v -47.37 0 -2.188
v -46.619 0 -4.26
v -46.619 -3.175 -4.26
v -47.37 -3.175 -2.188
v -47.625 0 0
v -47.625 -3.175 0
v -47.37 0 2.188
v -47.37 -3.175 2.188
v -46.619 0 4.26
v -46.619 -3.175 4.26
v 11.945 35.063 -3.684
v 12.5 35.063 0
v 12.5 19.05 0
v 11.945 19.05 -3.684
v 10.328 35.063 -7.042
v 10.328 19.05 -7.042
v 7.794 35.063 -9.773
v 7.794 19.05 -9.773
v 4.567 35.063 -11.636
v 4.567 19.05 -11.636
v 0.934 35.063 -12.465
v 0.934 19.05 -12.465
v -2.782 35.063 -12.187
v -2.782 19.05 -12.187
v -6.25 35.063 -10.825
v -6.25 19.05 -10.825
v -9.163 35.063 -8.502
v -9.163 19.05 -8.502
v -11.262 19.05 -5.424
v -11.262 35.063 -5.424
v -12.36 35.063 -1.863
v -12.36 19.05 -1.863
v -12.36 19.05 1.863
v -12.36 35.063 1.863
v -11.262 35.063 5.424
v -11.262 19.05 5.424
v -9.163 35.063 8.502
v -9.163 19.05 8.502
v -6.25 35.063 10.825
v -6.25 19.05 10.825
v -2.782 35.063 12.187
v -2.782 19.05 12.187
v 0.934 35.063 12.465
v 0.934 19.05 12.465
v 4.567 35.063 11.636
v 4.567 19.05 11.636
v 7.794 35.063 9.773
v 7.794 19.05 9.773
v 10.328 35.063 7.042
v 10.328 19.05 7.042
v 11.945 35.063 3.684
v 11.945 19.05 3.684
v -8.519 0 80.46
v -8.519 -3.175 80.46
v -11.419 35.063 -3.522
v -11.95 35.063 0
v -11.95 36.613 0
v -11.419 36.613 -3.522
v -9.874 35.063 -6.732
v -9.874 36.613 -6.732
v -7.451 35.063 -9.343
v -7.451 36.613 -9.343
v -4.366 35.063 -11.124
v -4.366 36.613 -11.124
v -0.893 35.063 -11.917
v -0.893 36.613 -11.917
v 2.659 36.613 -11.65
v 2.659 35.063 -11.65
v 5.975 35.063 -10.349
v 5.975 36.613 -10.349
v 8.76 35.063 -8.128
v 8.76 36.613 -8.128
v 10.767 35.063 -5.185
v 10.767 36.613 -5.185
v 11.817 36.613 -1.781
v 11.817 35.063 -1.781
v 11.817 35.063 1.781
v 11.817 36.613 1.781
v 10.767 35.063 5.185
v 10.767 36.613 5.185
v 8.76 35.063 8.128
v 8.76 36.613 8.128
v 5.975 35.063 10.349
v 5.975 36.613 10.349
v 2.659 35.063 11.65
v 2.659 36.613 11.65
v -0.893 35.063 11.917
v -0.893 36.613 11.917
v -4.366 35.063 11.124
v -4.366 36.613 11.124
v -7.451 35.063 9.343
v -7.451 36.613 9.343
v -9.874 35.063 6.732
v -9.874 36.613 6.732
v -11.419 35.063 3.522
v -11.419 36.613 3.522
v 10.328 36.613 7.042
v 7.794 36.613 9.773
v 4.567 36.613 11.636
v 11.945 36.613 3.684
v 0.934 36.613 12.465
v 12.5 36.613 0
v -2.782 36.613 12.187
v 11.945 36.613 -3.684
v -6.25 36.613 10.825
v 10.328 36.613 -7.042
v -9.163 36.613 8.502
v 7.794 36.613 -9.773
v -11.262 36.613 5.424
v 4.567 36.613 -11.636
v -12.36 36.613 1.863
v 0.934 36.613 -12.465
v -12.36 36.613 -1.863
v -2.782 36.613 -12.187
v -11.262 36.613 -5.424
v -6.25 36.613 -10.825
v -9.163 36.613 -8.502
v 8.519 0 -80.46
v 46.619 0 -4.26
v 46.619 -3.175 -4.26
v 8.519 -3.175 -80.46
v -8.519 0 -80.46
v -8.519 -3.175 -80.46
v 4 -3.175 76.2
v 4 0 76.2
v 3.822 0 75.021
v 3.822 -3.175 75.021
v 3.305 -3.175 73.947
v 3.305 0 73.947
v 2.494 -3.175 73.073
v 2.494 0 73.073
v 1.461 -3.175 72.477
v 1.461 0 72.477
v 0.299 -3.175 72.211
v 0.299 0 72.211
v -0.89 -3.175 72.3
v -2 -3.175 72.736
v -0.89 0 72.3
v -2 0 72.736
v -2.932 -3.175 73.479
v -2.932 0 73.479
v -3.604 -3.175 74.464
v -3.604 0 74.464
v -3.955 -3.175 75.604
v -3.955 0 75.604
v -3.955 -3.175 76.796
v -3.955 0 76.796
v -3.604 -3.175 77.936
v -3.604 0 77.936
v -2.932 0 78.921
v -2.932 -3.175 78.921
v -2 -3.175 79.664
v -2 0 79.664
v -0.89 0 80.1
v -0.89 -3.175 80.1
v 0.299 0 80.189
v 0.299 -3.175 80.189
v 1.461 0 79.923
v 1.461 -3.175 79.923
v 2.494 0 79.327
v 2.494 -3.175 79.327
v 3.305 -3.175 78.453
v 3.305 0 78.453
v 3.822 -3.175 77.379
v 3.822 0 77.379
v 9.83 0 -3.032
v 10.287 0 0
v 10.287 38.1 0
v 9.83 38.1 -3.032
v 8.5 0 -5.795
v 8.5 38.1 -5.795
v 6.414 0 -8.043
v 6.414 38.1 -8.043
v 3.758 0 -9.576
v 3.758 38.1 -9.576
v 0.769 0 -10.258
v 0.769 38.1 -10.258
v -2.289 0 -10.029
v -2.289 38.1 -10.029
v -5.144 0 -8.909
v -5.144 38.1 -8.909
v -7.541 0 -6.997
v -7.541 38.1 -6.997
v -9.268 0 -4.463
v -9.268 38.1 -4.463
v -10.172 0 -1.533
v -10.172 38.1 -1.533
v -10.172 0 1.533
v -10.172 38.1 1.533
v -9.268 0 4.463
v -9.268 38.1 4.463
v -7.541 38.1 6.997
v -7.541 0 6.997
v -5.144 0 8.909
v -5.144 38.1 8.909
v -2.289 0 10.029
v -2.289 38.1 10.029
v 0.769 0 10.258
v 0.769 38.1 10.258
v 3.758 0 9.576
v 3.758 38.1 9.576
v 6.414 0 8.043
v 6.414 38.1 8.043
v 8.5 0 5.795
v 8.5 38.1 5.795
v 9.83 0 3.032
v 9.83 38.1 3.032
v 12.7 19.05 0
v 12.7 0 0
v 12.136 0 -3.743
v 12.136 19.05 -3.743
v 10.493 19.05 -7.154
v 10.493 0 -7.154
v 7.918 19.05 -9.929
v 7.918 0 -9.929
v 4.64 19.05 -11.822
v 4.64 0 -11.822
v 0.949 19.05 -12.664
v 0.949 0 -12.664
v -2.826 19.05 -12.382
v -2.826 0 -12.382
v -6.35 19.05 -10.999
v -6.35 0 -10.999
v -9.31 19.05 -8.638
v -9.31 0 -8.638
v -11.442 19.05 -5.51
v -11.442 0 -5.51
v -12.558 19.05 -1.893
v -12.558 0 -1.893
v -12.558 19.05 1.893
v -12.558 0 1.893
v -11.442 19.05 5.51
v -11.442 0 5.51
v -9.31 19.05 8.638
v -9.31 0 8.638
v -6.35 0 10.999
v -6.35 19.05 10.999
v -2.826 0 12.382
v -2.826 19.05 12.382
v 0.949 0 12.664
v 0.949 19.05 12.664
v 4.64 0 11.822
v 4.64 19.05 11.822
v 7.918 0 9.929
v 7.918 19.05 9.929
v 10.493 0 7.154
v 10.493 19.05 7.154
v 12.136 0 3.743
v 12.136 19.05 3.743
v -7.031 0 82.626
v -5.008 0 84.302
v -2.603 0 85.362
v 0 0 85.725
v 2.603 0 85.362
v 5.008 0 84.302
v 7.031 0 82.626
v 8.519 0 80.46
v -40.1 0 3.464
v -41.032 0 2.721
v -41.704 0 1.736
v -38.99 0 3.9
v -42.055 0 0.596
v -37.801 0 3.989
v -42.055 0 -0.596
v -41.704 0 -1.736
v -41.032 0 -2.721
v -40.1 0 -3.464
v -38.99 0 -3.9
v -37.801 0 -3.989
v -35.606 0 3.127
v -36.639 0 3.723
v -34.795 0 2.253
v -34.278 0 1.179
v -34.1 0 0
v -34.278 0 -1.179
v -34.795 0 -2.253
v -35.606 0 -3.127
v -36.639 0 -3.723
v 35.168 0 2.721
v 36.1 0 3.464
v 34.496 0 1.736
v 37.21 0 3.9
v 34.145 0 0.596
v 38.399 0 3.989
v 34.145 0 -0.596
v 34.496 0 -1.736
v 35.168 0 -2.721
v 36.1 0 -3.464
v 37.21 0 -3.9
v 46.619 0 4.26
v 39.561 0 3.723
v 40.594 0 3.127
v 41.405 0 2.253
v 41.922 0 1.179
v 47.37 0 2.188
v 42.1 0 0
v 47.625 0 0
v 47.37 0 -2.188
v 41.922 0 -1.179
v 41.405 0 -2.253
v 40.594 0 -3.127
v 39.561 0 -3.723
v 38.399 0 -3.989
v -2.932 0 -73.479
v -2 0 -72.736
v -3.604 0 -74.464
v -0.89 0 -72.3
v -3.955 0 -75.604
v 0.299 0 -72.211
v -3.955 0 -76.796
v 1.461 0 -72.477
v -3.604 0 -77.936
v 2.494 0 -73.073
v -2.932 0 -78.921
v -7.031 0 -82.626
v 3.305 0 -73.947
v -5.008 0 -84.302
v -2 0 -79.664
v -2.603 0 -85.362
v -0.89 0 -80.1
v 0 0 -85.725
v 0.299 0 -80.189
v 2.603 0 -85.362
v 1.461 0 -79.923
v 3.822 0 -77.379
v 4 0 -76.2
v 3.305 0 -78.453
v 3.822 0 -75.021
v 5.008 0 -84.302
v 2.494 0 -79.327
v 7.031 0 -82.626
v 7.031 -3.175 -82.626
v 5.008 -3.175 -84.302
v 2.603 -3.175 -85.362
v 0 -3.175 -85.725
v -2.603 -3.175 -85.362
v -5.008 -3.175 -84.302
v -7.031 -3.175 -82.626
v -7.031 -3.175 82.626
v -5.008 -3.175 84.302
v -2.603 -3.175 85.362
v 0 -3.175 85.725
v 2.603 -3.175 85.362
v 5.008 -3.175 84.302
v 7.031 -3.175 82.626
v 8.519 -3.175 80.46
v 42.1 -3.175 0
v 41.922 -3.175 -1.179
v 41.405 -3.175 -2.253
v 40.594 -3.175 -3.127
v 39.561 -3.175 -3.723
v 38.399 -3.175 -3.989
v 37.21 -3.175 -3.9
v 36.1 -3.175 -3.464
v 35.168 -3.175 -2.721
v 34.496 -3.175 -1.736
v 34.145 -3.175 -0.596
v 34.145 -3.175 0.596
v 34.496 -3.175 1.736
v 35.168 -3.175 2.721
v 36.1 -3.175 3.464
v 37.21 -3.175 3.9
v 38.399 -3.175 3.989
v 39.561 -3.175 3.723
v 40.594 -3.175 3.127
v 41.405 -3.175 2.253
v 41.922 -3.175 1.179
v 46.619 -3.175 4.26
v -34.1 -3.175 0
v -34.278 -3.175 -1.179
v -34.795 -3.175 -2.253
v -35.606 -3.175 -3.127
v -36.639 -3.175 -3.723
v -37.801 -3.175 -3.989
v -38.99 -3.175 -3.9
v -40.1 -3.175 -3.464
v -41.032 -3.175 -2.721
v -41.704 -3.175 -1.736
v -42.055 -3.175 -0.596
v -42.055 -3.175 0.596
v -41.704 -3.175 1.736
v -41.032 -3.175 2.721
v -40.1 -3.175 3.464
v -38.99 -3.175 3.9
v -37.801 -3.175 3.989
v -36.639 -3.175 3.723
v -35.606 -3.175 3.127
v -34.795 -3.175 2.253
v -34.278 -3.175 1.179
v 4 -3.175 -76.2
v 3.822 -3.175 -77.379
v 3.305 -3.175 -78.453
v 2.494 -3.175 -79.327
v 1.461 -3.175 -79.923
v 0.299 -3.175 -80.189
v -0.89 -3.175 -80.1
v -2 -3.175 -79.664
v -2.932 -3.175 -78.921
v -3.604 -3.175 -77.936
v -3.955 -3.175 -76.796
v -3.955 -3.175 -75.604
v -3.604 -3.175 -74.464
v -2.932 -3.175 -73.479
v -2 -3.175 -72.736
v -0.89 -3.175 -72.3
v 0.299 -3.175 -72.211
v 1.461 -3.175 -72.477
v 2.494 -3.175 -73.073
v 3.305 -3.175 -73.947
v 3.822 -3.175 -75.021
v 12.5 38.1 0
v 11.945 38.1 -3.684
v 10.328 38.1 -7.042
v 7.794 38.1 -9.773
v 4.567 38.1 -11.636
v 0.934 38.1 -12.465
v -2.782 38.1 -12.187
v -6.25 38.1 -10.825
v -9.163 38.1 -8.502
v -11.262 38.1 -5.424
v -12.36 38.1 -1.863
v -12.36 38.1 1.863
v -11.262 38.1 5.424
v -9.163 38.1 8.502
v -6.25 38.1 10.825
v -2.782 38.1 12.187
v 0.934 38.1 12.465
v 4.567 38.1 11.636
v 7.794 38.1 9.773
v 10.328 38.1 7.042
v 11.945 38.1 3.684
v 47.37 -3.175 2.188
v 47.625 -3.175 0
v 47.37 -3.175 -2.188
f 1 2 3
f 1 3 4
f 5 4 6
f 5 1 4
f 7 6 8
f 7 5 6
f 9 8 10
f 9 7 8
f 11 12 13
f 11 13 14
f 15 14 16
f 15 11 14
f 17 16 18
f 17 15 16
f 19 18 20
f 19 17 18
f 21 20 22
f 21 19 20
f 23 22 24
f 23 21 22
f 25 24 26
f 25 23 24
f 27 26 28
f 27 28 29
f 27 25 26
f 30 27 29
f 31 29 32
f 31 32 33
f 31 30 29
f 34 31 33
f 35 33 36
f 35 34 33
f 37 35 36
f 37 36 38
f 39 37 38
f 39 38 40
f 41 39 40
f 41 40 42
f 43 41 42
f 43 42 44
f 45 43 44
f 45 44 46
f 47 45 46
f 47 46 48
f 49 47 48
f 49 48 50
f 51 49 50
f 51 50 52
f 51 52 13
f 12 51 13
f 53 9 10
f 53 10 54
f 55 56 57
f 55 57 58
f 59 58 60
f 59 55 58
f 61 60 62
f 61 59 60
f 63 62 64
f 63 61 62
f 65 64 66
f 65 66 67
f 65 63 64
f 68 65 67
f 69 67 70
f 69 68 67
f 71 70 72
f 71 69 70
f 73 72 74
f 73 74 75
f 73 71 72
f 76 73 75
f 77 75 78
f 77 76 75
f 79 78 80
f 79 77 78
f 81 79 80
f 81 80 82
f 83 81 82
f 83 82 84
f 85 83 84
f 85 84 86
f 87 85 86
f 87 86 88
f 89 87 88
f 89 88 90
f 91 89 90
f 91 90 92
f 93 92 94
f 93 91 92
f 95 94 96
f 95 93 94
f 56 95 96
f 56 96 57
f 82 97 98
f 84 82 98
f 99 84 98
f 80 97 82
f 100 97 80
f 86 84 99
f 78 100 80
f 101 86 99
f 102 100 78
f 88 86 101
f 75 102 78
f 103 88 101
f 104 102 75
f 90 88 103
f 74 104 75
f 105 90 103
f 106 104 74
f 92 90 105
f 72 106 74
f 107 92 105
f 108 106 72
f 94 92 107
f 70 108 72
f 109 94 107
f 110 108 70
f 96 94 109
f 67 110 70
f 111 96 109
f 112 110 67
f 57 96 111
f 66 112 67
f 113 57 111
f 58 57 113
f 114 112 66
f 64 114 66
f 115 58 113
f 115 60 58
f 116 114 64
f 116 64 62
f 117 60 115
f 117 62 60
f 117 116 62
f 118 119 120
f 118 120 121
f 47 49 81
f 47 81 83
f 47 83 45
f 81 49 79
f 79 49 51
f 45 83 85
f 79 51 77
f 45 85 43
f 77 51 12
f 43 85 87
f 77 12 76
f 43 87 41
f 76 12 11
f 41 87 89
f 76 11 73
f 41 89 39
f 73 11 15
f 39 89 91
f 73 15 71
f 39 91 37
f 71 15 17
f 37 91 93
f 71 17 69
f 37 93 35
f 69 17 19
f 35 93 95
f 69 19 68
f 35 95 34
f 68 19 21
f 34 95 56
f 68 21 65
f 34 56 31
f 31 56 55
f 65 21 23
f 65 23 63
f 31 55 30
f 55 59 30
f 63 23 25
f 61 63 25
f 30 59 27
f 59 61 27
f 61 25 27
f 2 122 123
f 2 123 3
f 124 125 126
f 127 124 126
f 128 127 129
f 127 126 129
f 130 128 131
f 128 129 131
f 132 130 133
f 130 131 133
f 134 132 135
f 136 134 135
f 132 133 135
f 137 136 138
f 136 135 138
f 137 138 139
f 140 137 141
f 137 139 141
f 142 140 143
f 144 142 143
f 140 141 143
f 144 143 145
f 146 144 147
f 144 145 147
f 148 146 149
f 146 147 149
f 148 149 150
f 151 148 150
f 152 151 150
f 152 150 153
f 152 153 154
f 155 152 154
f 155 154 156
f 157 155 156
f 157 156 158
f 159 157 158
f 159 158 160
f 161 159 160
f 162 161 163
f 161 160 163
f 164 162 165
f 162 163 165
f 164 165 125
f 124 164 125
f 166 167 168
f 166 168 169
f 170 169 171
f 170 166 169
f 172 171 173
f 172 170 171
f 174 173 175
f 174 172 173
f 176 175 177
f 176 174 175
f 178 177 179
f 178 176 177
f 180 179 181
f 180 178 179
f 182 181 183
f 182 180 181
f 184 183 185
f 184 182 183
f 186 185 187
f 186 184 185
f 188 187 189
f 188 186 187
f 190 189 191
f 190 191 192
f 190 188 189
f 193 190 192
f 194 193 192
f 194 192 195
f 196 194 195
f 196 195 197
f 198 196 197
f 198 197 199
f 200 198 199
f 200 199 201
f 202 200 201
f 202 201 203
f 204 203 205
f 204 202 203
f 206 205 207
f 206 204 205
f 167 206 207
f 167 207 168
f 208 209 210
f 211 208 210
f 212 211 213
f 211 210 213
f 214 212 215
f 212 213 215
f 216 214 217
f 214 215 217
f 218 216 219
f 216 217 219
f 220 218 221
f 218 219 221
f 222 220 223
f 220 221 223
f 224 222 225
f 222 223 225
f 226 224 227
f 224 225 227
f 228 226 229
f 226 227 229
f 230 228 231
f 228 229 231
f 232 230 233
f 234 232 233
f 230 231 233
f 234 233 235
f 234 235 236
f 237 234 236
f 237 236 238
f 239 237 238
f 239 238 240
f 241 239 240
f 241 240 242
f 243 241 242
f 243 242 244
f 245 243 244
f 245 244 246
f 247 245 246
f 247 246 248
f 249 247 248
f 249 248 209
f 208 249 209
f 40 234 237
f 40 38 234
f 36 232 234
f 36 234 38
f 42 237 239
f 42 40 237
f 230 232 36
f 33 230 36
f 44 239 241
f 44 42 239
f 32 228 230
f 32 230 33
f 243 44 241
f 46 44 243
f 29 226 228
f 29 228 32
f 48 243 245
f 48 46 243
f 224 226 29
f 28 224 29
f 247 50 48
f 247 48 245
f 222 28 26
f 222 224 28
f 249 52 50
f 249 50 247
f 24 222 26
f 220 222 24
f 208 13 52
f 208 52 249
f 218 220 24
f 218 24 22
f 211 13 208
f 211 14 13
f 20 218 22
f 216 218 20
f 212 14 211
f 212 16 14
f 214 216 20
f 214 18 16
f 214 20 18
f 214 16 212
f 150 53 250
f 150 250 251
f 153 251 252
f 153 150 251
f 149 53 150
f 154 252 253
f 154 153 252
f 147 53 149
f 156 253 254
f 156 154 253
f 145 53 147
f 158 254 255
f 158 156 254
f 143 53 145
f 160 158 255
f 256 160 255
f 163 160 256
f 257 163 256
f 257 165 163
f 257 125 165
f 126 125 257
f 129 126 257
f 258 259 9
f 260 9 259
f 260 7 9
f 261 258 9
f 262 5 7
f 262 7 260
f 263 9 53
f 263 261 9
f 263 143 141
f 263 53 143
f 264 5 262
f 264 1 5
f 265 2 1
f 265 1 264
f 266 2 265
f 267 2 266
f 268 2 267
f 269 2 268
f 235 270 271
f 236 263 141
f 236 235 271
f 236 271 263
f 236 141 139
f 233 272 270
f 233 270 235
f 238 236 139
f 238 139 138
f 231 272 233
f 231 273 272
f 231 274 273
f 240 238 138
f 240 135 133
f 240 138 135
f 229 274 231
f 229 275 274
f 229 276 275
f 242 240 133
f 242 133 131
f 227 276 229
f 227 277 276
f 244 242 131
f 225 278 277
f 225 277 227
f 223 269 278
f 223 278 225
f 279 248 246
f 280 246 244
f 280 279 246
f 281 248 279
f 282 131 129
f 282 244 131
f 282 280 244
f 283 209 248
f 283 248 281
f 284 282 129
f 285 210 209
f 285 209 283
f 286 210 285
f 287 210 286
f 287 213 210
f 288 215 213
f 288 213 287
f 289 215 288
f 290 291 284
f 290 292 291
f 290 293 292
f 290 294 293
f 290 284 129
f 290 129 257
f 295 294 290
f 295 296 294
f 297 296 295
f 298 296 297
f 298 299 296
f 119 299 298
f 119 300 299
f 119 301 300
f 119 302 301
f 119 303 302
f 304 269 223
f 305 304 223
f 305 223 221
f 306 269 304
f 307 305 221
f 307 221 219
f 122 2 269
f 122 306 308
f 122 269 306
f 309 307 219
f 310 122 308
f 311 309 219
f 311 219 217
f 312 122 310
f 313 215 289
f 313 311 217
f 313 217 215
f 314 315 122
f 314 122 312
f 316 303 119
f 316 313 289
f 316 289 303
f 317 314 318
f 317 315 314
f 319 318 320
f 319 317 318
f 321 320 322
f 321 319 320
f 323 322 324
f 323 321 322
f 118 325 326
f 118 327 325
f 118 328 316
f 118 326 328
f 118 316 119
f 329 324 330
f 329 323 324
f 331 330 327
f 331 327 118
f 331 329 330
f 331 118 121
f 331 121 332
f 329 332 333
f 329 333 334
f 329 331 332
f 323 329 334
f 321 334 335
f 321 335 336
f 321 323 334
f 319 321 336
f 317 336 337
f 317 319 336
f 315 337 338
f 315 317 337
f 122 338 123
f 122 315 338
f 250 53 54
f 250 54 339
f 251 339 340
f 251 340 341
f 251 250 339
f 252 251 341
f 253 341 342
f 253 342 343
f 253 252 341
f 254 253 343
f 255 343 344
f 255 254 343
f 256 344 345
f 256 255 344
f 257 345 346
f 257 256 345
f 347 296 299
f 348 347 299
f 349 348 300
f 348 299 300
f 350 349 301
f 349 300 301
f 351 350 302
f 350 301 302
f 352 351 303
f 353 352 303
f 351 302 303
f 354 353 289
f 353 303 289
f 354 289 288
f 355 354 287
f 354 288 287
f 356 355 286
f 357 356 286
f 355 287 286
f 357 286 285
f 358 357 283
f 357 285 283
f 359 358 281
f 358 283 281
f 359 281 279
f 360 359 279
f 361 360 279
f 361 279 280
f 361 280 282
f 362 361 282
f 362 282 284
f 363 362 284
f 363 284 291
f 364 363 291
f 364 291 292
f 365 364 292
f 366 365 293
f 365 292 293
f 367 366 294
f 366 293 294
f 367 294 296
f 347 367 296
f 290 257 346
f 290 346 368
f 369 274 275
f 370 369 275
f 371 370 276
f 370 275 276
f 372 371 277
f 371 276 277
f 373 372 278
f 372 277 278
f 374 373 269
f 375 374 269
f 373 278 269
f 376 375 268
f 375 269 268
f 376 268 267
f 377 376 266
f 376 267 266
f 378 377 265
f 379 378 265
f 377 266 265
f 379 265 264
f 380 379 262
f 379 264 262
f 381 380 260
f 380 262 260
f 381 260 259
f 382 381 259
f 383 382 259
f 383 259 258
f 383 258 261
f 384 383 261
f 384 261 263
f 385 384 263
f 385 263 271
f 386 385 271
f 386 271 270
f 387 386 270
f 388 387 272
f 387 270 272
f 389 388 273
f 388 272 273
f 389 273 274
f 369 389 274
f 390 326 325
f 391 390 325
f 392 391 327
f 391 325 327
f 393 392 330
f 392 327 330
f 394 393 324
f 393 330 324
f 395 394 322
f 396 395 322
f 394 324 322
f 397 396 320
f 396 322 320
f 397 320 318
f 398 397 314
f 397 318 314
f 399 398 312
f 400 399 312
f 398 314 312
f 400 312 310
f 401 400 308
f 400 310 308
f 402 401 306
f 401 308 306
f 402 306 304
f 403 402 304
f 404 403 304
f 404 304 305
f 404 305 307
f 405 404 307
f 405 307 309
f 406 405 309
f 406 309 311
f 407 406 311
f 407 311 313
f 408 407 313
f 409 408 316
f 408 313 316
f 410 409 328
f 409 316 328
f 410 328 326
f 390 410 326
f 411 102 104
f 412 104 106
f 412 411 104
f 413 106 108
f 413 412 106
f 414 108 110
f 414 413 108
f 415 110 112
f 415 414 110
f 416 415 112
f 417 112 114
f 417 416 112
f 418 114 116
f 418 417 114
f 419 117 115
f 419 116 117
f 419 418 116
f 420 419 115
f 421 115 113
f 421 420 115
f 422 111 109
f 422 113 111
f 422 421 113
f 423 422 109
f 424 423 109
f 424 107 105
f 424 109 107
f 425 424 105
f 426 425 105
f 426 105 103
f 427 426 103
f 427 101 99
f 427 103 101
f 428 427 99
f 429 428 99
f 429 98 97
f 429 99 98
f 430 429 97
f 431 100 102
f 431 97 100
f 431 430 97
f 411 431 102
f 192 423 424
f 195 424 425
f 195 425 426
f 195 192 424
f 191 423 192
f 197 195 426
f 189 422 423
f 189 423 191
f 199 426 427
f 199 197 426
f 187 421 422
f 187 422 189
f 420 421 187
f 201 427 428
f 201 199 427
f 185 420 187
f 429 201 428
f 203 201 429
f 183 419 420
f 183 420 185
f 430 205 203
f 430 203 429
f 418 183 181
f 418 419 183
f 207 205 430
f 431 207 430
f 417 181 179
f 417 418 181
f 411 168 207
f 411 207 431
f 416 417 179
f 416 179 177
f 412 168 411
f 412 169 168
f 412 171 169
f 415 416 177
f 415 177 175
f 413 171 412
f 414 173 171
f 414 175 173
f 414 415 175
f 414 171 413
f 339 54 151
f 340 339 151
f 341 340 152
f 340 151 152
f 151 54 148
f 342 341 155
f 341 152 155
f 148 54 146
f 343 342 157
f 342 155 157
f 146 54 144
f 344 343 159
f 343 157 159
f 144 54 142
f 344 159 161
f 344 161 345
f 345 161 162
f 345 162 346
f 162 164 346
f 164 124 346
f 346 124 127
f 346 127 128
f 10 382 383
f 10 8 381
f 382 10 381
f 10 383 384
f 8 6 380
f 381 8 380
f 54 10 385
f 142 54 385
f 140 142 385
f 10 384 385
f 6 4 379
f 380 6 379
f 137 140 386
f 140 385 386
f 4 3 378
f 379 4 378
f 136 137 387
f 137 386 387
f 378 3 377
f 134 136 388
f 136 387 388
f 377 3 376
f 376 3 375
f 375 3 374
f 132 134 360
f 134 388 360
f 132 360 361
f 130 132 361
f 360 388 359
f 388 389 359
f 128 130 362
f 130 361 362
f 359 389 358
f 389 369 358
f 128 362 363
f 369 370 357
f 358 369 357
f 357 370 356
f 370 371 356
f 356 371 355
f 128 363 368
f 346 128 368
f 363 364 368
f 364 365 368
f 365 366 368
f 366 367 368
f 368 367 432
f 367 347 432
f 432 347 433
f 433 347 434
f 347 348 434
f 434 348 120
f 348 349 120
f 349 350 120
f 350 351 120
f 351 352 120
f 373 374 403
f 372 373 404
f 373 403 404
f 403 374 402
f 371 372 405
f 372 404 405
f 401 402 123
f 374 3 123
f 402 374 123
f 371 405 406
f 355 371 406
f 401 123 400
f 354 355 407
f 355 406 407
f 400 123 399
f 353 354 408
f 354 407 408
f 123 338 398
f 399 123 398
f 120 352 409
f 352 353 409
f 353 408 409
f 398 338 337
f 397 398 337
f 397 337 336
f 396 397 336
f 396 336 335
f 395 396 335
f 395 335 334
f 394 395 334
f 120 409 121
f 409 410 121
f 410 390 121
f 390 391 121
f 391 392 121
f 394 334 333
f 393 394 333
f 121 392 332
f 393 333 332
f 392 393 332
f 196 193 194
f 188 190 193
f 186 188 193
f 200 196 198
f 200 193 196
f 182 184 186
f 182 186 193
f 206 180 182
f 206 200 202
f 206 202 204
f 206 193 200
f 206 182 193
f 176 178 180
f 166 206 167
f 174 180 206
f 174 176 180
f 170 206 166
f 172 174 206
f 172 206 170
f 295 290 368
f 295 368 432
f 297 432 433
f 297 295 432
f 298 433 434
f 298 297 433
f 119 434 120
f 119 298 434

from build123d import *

# Parameters (mm, degrees)
SKETCH1_R           = 4
BOSS_EXTRUDE1_DEPTH = 3.175
SKETCH2_R           = 12.7
SKETCH2_R_2         = 10.287
EXTRUDE_THIN1_DEPTH = 38.1
SKETCH3_R           = 12.7
SKETCH3_R_2         = 12.5
CUT_EXTRUDE2_DEPTH  = 19.05
SKETCH4_R           = 12.5
SKETCH4_R_2         = 11.95
CUT_EXTRUDE3_DEPTH  = 1.55


with BuildPart() as part:
    # Sketch1 → Boss-Extrude1 (new body)
    with BuildSketch(Plane(origin=(0, 0, 0), x_dir=(1, 0, 0), z_dir=(0, 1, 0))):
        with BuildLine():
            Line((-8.519418994, 80.459709497), (-46.619418994, 4.259709497))
            ThreePointArc((-46.619418994, 4.259709497), (-47.625, 0), (-46.619418994, -4.259709497))
            Line((-46.619418994, -4.259709497), (-8.519418994, -80.459709497))
            ThreePointArc((-8.519418994, -80.459709497), (0, -85.725), (8.519418994, -80.459709497))
            Line((8.519418994, -80.459709497), (46.619418994, -4.259709497))
            ThreePointArc((46.619418994, -4.259709497), (47.625, 0), (46.619418994, 4.259709497))
            Line((46.619418994, 4.259709497), (8.519418994, 80.459709497))
            ThreePointArc((8.519418994, 80.459709497), (0, 85.725), (-8.519418994, 80.459709497))
        make_face()
        with Locations((0, 76.2)):
            Circle(SKETCH1_R, mode=Mode.SUBTRACT)
        with Locations((0, -76.2)):
            Circle(SKETCH1_R, mode=Mode.SUBTRACT)
        with Locations((-38.1, 0)):
            Circle(SKETCH1_R, mode=Mode.SUBTRACT)
        with Locations((38.1, 0)):
            Circle(SKETCH1_R, mode=Mode.SUBTRACT)
    extrude(amount=-BOSS_EXTRUDE1_DEPTH)

    # Sketch2 → Extrude-Thin1 (add)
    with BuildSketch(Plane(origin=(0, 0, 0), x_dir=(1, 0, 0), z_dir=(0, 1, 0))):
        Circle(SKETCH2_R)
        Circle(SKETCH2_R_2, mode=Mode.SUBTRACT)
    extrude(amount=EXTRUDE_THIN1_DEPTH)

    # Sketch3 → Cut-Extrude2 (cut)
    with BuildSketch(Plane(origin=(0, 38.1, 0), x_dir=(1, 0, 0), z_dir=(0, 1, 0))):
        Circle(SKETCH3_R)
        Circle(SKETCH3_R_2, mode=Mode.SUBTRACT)
    extrude(amount=-CUT_EXTRUDE2_DEPTH, mode=Mode.SUBTRACT)

    # Sketch4 → Cut-Extrude3 (cut)
    with BuildSketch(Plane(origin=(0, 35.063199876, 0), x_dir=(-1, 0, 0), z_dir=(0, -1, 0))):
        Circle(SKETCH4_R)
        Circle(SKETCH4_R_2, mode=Mode.SUBTRACT)
    extrude(amount=-CUT_EXTRUDE3_DEPTH, mode=Mode.SUBTRACT)


solid = part.part
